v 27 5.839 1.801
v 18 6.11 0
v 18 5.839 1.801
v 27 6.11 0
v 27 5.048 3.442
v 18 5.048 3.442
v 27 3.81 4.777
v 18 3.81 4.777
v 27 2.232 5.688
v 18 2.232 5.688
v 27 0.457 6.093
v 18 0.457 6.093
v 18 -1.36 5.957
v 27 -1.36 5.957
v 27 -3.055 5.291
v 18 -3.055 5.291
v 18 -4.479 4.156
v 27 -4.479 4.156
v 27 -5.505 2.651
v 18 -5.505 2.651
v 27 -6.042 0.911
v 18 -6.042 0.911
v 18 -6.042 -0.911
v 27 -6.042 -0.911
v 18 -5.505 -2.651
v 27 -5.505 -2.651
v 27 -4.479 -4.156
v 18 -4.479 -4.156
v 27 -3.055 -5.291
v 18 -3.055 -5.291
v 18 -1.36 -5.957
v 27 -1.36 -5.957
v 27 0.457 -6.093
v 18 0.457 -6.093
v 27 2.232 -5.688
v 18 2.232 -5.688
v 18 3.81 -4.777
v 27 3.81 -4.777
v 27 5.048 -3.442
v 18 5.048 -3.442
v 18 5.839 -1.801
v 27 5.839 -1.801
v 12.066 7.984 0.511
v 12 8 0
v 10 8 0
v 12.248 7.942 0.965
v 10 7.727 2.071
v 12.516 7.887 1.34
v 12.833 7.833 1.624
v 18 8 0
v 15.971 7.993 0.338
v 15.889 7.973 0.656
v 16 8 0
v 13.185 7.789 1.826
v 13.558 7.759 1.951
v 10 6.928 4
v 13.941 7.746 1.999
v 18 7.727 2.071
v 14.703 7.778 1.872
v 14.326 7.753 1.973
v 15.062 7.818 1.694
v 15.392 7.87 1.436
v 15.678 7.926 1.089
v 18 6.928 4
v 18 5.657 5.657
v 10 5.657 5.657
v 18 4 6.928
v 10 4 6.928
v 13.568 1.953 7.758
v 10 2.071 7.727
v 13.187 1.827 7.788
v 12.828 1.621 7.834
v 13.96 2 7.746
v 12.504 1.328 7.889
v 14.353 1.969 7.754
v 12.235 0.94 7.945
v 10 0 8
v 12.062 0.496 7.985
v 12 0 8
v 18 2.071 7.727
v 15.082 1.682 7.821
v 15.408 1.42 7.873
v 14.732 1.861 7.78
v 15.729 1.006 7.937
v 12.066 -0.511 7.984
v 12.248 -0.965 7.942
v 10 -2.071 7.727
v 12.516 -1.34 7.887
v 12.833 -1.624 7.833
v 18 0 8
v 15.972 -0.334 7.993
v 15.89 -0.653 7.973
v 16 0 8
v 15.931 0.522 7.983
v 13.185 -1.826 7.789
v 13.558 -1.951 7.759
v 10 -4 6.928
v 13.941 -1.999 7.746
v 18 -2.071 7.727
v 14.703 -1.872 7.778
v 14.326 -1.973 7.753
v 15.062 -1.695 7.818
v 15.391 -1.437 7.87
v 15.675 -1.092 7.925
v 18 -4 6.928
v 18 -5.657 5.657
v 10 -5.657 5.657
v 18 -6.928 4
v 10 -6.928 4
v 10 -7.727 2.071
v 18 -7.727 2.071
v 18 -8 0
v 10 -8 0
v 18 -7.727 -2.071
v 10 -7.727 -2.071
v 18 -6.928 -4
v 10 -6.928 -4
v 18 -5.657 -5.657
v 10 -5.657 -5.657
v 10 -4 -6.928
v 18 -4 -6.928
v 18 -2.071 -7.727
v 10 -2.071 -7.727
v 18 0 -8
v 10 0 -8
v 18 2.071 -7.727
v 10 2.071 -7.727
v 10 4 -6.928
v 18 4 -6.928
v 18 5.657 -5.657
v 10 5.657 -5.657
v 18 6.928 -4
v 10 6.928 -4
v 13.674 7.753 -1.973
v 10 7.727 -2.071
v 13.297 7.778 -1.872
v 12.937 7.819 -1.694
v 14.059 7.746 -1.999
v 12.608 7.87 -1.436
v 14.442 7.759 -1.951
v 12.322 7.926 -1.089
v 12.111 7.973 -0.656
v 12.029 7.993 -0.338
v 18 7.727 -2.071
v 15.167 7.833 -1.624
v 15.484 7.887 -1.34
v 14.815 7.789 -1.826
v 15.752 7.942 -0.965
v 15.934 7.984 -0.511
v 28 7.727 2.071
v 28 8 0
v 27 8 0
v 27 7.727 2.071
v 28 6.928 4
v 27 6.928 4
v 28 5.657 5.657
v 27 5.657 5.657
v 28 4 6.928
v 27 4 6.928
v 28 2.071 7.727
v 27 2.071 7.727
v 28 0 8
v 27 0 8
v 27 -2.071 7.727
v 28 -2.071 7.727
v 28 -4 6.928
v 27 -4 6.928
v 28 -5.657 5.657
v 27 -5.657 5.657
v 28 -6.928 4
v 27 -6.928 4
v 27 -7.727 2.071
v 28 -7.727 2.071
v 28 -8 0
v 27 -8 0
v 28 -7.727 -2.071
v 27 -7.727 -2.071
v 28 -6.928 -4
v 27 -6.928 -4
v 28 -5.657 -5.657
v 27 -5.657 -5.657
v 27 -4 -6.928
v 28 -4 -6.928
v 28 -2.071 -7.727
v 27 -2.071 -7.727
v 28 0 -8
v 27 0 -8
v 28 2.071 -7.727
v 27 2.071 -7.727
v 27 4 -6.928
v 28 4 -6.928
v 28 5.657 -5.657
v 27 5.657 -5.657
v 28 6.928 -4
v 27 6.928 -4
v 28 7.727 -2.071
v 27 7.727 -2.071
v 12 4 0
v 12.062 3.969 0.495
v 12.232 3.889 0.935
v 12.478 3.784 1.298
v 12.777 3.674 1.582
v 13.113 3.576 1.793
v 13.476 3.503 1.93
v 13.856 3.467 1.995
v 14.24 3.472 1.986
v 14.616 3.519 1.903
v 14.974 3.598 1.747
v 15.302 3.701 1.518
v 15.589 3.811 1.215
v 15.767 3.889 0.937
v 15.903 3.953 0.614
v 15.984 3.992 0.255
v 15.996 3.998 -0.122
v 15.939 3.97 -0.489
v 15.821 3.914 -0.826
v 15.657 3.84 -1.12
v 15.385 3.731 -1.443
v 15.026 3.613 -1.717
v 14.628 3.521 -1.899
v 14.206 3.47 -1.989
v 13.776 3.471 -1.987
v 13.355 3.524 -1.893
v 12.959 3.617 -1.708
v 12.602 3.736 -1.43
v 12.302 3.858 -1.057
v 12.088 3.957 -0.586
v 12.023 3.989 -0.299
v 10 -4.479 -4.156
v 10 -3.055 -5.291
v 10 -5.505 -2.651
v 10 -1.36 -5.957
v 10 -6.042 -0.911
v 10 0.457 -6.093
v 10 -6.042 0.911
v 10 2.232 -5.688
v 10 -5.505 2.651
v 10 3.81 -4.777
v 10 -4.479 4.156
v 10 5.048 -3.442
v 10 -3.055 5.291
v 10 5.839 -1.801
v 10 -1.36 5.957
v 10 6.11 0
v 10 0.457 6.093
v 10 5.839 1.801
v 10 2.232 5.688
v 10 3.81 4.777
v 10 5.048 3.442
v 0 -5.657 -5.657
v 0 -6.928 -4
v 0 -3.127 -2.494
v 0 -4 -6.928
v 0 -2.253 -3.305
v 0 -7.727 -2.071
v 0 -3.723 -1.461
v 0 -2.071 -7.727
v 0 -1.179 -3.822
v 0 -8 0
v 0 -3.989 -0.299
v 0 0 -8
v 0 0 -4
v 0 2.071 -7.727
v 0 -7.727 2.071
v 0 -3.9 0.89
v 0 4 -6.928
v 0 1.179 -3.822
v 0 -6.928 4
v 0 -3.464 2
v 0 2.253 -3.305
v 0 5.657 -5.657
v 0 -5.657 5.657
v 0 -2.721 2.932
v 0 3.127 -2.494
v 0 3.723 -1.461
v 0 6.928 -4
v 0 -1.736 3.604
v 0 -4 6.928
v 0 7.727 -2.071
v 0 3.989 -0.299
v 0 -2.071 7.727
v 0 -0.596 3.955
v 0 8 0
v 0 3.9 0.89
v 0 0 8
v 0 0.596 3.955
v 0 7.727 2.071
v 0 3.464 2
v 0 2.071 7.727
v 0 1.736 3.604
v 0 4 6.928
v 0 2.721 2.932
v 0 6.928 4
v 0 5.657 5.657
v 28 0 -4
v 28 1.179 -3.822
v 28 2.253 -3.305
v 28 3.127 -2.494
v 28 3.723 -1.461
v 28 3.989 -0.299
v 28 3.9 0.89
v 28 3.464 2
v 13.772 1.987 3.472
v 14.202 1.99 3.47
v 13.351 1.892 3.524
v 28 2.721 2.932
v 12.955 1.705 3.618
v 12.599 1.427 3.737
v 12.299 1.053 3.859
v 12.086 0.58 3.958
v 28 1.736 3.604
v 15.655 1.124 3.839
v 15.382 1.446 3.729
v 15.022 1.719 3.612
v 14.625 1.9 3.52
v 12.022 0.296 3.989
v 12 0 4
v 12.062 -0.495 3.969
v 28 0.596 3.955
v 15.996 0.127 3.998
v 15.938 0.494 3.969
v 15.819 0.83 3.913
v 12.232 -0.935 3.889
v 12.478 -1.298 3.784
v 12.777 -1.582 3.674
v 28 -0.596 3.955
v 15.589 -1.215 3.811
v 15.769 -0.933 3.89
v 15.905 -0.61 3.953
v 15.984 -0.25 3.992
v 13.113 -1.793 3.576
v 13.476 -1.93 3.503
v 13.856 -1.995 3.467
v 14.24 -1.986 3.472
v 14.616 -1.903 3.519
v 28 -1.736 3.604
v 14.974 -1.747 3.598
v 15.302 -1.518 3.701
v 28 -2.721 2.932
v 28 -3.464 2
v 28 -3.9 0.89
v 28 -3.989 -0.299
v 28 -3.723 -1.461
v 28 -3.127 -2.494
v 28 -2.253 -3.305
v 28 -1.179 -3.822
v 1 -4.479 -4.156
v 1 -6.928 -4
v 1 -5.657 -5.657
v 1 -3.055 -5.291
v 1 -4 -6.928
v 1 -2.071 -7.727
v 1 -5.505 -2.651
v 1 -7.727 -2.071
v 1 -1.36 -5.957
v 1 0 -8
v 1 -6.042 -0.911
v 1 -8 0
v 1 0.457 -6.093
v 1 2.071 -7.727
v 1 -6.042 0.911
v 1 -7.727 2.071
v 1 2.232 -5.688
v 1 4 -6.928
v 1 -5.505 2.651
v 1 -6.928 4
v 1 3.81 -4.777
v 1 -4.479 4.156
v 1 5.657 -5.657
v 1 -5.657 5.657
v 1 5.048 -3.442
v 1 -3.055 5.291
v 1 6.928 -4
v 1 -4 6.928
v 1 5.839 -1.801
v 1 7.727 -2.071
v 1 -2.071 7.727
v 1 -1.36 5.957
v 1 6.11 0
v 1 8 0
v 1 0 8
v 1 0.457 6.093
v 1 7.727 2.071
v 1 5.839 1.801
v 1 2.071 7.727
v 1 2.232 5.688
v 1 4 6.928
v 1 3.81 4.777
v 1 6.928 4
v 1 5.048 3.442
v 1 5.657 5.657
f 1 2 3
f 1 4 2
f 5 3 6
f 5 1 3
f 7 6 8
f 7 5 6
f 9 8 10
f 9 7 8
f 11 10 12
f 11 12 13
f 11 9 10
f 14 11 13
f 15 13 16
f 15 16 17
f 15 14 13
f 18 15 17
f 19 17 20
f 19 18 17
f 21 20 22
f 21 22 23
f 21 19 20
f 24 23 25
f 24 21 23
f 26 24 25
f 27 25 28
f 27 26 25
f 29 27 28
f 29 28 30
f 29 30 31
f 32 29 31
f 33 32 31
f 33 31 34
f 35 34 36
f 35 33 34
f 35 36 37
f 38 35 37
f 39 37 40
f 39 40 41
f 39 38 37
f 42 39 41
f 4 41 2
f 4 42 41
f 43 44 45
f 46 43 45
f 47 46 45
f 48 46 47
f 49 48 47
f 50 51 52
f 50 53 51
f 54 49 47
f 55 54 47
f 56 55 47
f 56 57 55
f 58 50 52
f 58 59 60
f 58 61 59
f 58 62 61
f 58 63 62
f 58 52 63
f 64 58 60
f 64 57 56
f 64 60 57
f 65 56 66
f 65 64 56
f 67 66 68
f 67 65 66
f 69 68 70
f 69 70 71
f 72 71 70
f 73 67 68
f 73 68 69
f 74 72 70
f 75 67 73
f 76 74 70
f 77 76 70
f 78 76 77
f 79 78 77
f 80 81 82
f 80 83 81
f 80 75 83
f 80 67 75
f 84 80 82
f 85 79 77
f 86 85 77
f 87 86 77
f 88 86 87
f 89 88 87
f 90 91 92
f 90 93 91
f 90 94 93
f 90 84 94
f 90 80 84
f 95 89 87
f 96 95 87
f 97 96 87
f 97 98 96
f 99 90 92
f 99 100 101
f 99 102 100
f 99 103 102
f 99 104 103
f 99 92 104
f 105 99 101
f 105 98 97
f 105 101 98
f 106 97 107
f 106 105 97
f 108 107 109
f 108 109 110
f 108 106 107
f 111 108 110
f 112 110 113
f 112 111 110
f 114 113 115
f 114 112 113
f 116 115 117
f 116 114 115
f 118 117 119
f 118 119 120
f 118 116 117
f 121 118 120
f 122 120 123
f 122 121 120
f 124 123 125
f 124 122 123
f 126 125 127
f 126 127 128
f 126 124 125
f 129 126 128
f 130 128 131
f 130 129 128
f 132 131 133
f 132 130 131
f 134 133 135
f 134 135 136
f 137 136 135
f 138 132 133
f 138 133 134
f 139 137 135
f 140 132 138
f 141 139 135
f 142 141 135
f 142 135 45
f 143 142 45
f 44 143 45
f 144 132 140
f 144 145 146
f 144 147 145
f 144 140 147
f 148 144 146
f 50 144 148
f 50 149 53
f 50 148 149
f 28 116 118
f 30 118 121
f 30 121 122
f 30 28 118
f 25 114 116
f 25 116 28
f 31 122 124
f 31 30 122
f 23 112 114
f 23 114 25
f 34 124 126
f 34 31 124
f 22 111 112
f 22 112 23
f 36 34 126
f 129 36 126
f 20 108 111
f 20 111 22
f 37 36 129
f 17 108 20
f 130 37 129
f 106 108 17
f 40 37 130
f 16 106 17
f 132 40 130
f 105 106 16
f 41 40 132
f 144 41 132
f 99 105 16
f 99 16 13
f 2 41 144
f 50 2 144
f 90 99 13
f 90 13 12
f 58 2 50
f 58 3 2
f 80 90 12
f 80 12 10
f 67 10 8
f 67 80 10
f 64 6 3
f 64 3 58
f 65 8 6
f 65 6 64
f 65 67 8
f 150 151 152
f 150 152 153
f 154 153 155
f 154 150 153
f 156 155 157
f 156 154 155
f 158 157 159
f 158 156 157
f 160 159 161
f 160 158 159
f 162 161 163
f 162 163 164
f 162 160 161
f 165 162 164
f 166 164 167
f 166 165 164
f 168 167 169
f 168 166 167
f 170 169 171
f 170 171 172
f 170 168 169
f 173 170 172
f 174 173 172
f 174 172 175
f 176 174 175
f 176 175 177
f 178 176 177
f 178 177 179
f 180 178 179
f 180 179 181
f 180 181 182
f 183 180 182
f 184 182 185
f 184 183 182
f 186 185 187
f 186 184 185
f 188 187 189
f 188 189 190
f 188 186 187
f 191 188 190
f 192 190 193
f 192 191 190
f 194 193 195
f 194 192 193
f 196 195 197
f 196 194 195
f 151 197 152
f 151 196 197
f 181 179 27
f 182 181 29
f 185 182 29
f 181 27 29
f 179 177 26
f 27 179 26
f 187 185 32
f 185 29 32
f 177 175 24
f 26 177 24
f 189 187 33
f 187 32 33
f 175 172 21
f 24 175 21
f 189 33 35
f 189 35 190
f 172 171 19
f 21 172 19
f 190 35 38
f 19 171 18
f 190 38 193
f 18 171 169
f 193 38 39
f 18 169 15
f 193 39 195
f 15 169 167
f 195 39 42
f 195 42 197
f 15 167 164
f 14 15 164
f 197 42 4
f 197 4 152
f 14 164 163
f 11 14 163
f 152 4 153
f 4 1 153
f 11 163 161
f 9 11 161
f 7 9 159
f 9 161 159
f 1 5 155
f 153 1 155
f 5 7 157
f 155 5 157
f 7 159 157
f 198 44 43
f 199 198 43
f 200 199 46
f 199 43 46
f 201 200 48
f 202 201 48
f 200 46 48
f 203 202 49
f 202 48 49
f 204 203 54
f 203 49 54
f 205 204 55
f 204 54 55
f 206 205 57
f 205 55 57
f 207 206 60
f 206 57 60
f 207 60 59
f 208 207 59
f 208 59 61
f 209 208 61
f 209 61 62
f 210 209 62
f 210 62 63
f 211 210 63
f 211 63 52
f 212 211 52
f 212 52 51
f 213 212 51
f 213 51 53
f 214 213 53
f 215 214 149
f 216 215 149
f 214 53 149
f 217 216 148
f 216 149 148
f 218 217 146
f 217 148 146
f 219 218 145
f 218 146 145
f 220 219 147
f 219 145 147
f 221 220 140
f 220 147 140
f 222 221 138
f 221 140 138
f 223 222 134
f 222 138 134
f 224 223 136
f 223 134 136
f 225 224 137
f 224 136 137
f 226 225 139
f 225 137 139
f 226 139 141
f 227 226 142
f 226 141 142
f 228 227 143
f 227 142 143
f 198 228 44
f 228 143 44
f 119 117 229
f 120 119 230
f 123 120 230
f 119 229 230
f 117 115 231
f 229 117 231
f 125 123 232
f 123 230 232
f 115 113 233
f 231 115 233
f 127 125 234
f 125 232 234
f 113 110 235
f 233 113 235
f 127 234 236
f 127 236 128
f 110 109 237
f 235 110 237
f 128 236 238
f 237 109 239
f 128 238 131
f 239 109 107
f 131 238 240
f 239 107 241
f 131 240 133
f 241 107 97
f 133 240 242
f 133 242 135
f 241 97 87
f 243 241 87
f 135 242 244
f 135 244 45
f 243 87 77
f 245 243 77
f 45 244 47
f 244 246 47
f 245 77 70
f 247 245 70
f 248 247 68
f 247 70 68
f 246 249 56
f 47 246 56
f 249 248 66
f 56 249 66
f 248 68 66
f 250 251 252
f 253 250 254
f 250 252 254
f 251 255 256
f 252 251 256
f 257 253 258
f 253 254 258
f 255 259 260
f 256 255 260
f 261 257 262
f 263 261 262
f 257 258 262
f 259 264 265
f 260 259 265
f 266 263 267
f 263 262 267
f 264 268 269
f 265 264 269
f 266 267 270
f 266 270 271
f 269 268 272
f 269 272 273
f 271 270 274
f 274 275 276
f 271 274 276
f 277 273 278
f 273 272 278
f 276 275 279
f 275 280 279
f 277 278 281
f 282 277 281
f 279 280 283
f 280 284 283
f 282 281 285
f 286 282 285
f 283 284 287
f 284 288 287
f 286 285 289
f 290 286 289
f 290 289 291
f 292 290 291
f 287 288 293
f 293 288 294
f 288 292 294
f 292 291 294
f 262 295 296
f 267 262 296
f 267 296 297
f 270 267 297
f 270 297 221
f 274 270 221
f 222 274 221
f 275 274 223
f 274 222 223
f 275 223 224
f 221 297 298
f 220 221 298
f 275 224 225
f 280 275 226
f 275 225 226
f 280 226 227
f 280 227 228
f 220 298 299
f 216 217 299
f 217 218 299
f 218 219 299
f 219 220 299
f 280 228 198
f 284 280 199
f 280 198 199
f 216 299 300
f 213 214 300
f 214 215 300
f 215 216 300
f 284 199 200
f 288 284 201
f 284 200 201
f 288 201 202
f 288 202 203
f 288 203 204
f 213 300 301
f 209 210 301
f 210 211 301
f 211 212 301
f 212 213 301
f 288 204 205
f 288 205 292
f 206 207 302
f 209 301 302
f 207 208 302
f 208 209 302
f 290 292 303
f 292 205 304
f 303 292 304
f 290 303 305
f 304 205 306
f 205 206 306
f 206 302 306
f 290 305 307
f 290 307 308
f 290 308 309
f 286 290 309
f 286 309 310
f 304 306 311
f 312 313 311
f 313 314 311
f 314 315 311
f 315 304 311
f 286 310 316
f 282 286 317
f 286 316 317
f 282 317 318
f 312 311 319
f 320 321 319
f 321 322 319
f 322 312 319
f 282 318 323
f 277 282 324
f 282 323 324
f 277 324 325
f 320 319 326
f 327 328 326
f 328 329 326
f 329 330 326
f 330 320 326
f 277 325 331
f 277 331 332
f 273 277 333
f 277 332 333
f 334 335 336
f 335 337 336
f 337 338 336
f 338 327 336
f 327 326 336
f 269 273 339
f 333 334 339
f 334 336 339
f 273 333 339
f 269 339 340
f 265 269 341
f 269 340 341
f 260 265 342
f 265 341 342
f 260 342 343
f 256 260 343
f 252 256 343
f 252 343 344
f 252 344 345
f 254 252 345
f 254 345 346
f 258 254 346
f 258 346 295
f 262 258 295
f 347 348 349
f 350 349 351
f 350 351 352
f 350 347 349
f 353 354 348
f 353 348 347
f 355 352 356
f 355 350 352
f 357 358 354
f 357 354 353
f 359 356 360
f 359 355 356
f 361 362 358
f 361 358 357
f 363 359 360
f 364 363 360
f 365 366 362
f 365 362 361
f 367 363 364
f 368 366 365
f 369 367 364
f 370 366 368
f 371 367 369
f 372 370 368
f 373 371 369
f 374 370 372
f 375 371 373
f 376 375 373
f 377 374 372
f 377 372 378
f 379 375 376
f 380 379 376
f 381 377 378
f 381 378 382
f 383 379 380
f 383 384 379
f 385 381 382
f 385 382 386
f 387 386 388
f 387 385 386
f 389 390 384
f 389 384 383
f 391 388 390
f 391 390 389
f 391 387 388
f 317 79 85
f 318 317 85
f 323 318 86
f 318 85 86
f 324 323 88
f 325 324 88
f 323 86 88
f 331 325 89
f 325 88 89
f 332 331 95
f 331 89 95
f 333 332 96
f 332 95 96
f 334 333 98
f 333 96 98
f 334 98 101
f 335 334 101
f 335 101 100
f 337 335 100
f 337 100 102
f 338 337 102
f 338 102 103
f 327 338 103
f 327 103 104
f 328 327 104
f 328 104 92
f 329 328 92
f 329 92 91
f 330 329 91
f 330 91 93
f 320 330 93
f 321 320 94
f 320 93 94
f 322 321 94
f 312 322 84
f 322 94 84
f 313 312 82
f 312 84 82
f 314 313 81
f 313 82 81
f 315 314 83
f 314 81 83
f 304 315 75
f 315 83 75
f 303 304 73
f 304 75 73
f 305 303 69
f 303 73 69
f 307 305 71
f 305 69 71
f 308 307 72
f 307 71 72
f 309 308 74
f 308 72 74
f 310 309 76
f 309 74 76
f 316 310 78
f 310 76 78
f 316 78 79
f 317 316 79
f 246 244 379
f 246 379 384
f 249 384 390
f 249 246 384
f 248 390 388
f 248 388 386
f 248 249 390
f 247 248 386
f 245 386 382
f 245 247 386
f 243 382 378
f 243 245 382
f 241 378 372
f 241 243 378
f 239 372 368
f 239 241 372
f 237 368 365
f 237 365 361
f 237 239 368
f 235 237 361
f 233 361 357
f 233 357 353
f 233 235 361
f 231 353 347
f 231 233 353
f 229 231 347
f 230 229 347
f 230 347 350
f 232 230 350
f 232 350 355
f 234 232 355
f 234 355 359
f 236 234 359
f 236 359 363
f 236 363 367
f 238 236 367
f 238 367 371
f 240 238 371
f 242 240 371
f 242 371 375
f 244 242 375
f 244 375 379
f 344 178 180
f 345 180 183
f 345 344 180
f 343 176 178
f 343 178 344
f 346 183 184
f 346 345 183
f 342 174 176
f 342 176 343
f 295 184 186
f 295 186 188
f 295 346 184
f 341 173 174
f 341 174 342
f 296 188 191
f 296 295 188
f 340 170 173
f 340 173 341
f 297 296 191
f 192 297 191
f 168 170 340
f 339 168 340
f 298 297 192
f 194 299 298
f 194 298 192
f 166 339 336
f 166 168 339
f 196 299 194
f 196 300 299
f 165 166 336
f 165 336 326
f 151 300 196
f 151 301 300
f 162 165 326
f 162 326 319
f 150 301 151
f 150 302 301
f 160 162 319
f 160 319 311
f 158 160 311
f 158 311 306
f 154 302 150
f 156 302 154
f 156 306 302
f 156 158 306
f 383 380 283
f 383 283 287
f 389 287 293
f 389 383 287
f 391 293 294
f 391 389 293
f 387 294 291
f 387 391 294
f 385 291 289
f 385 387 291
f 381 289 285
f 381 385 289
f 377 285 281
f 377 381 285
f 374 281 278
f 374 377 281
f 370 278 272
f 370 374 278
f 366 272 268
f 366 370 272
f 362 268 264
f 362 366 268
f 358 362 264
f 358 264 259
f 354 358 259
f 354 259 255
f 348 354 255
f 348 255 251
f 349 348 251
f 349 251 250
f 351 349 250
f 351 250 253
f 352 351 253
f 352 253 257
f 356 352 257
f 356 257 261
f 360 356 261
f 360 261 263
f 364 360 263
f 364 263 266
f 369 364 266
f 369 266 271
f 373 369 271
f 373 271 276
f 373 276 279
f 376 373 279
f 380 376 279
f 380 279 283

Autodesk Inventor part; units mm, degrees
ref_plane "YZ Plane" through (0, 0, 0) normal (1, 0, 0) x (0, 1, 0)
ref_plane "XY Plane" through (0, 0, 0) normal (0, 0, 1) x (1, 0, 0)
sketch "Эскиз1" plane through (0, 0, 0) normal (0, 0, 1) x (1, 0, 0)
  line L0 (10, 6.11) -> (10, 8)
  line L1 (10, 8) -> (18, 8)
  line L2 (18, 8) -> (18, 6.11)
  line L3 (18, 6.11) -> (27, 6.11)
  line L4 (27, 6.11) -> (27, 8)
  line L5 (27, 8) -> (28, 8)
  line L6 (28, 8) -> (28, 0)
  line L7 (0, 0) -> (0, 8)
  line L8 (0, 8) -> (1, 8)
  line L9 (1, 8) -> (1, 6.11)
  line L10 (1, 6.11) -> (10, 6.11)
  line L11 (0, 0) -> (28, 0)
  point P0 (22.5, 6.11)
  dimension "d0" = 6.11
  dimension "d1" = 8
  dimension "d2" = 28
  dimension "d4" = 9
  dimension "d5" = 8
revolve "Вращение1" add sketch "Эскиз1" angle 360 about axis through (0, 0, 0) along (1, 0, 0)
sketch "Эскиз2" plane through (28, 0, 0) normal (1, 0, 0) x (0, 0, -1)
  circle A0 centre (0, 0) radius 4
  dimension "d7" = 8
extrude "Выдавливание1" cut sketch "Эскиз2" against normal through all
ref_plane "РабПлоскость1" through (14, 8, 0) normal (0, 1, 0) x (-1, 0, 0)
sketch "Эскиз3" plane through (14, 8, 0) normal (0, 1, 0) x (-1, 0, 0)
  circle A0 centre (0, 0) radius 2
  line L0 (4, -8) -> (-4, -8) projected
  point P0 (14, 0)
  point P1 (0, -8)
  dimension "d10" = 4
extrude "Выдавливание2" cut sketch "Эскиз3" against normal blind 6.5
pattern_circular "Круговой массив1" count 2 over 90 about axis through (14, 0, 0) along (1, 0, 0) of "Выдавливание2"
properties part number "double_gt2"
